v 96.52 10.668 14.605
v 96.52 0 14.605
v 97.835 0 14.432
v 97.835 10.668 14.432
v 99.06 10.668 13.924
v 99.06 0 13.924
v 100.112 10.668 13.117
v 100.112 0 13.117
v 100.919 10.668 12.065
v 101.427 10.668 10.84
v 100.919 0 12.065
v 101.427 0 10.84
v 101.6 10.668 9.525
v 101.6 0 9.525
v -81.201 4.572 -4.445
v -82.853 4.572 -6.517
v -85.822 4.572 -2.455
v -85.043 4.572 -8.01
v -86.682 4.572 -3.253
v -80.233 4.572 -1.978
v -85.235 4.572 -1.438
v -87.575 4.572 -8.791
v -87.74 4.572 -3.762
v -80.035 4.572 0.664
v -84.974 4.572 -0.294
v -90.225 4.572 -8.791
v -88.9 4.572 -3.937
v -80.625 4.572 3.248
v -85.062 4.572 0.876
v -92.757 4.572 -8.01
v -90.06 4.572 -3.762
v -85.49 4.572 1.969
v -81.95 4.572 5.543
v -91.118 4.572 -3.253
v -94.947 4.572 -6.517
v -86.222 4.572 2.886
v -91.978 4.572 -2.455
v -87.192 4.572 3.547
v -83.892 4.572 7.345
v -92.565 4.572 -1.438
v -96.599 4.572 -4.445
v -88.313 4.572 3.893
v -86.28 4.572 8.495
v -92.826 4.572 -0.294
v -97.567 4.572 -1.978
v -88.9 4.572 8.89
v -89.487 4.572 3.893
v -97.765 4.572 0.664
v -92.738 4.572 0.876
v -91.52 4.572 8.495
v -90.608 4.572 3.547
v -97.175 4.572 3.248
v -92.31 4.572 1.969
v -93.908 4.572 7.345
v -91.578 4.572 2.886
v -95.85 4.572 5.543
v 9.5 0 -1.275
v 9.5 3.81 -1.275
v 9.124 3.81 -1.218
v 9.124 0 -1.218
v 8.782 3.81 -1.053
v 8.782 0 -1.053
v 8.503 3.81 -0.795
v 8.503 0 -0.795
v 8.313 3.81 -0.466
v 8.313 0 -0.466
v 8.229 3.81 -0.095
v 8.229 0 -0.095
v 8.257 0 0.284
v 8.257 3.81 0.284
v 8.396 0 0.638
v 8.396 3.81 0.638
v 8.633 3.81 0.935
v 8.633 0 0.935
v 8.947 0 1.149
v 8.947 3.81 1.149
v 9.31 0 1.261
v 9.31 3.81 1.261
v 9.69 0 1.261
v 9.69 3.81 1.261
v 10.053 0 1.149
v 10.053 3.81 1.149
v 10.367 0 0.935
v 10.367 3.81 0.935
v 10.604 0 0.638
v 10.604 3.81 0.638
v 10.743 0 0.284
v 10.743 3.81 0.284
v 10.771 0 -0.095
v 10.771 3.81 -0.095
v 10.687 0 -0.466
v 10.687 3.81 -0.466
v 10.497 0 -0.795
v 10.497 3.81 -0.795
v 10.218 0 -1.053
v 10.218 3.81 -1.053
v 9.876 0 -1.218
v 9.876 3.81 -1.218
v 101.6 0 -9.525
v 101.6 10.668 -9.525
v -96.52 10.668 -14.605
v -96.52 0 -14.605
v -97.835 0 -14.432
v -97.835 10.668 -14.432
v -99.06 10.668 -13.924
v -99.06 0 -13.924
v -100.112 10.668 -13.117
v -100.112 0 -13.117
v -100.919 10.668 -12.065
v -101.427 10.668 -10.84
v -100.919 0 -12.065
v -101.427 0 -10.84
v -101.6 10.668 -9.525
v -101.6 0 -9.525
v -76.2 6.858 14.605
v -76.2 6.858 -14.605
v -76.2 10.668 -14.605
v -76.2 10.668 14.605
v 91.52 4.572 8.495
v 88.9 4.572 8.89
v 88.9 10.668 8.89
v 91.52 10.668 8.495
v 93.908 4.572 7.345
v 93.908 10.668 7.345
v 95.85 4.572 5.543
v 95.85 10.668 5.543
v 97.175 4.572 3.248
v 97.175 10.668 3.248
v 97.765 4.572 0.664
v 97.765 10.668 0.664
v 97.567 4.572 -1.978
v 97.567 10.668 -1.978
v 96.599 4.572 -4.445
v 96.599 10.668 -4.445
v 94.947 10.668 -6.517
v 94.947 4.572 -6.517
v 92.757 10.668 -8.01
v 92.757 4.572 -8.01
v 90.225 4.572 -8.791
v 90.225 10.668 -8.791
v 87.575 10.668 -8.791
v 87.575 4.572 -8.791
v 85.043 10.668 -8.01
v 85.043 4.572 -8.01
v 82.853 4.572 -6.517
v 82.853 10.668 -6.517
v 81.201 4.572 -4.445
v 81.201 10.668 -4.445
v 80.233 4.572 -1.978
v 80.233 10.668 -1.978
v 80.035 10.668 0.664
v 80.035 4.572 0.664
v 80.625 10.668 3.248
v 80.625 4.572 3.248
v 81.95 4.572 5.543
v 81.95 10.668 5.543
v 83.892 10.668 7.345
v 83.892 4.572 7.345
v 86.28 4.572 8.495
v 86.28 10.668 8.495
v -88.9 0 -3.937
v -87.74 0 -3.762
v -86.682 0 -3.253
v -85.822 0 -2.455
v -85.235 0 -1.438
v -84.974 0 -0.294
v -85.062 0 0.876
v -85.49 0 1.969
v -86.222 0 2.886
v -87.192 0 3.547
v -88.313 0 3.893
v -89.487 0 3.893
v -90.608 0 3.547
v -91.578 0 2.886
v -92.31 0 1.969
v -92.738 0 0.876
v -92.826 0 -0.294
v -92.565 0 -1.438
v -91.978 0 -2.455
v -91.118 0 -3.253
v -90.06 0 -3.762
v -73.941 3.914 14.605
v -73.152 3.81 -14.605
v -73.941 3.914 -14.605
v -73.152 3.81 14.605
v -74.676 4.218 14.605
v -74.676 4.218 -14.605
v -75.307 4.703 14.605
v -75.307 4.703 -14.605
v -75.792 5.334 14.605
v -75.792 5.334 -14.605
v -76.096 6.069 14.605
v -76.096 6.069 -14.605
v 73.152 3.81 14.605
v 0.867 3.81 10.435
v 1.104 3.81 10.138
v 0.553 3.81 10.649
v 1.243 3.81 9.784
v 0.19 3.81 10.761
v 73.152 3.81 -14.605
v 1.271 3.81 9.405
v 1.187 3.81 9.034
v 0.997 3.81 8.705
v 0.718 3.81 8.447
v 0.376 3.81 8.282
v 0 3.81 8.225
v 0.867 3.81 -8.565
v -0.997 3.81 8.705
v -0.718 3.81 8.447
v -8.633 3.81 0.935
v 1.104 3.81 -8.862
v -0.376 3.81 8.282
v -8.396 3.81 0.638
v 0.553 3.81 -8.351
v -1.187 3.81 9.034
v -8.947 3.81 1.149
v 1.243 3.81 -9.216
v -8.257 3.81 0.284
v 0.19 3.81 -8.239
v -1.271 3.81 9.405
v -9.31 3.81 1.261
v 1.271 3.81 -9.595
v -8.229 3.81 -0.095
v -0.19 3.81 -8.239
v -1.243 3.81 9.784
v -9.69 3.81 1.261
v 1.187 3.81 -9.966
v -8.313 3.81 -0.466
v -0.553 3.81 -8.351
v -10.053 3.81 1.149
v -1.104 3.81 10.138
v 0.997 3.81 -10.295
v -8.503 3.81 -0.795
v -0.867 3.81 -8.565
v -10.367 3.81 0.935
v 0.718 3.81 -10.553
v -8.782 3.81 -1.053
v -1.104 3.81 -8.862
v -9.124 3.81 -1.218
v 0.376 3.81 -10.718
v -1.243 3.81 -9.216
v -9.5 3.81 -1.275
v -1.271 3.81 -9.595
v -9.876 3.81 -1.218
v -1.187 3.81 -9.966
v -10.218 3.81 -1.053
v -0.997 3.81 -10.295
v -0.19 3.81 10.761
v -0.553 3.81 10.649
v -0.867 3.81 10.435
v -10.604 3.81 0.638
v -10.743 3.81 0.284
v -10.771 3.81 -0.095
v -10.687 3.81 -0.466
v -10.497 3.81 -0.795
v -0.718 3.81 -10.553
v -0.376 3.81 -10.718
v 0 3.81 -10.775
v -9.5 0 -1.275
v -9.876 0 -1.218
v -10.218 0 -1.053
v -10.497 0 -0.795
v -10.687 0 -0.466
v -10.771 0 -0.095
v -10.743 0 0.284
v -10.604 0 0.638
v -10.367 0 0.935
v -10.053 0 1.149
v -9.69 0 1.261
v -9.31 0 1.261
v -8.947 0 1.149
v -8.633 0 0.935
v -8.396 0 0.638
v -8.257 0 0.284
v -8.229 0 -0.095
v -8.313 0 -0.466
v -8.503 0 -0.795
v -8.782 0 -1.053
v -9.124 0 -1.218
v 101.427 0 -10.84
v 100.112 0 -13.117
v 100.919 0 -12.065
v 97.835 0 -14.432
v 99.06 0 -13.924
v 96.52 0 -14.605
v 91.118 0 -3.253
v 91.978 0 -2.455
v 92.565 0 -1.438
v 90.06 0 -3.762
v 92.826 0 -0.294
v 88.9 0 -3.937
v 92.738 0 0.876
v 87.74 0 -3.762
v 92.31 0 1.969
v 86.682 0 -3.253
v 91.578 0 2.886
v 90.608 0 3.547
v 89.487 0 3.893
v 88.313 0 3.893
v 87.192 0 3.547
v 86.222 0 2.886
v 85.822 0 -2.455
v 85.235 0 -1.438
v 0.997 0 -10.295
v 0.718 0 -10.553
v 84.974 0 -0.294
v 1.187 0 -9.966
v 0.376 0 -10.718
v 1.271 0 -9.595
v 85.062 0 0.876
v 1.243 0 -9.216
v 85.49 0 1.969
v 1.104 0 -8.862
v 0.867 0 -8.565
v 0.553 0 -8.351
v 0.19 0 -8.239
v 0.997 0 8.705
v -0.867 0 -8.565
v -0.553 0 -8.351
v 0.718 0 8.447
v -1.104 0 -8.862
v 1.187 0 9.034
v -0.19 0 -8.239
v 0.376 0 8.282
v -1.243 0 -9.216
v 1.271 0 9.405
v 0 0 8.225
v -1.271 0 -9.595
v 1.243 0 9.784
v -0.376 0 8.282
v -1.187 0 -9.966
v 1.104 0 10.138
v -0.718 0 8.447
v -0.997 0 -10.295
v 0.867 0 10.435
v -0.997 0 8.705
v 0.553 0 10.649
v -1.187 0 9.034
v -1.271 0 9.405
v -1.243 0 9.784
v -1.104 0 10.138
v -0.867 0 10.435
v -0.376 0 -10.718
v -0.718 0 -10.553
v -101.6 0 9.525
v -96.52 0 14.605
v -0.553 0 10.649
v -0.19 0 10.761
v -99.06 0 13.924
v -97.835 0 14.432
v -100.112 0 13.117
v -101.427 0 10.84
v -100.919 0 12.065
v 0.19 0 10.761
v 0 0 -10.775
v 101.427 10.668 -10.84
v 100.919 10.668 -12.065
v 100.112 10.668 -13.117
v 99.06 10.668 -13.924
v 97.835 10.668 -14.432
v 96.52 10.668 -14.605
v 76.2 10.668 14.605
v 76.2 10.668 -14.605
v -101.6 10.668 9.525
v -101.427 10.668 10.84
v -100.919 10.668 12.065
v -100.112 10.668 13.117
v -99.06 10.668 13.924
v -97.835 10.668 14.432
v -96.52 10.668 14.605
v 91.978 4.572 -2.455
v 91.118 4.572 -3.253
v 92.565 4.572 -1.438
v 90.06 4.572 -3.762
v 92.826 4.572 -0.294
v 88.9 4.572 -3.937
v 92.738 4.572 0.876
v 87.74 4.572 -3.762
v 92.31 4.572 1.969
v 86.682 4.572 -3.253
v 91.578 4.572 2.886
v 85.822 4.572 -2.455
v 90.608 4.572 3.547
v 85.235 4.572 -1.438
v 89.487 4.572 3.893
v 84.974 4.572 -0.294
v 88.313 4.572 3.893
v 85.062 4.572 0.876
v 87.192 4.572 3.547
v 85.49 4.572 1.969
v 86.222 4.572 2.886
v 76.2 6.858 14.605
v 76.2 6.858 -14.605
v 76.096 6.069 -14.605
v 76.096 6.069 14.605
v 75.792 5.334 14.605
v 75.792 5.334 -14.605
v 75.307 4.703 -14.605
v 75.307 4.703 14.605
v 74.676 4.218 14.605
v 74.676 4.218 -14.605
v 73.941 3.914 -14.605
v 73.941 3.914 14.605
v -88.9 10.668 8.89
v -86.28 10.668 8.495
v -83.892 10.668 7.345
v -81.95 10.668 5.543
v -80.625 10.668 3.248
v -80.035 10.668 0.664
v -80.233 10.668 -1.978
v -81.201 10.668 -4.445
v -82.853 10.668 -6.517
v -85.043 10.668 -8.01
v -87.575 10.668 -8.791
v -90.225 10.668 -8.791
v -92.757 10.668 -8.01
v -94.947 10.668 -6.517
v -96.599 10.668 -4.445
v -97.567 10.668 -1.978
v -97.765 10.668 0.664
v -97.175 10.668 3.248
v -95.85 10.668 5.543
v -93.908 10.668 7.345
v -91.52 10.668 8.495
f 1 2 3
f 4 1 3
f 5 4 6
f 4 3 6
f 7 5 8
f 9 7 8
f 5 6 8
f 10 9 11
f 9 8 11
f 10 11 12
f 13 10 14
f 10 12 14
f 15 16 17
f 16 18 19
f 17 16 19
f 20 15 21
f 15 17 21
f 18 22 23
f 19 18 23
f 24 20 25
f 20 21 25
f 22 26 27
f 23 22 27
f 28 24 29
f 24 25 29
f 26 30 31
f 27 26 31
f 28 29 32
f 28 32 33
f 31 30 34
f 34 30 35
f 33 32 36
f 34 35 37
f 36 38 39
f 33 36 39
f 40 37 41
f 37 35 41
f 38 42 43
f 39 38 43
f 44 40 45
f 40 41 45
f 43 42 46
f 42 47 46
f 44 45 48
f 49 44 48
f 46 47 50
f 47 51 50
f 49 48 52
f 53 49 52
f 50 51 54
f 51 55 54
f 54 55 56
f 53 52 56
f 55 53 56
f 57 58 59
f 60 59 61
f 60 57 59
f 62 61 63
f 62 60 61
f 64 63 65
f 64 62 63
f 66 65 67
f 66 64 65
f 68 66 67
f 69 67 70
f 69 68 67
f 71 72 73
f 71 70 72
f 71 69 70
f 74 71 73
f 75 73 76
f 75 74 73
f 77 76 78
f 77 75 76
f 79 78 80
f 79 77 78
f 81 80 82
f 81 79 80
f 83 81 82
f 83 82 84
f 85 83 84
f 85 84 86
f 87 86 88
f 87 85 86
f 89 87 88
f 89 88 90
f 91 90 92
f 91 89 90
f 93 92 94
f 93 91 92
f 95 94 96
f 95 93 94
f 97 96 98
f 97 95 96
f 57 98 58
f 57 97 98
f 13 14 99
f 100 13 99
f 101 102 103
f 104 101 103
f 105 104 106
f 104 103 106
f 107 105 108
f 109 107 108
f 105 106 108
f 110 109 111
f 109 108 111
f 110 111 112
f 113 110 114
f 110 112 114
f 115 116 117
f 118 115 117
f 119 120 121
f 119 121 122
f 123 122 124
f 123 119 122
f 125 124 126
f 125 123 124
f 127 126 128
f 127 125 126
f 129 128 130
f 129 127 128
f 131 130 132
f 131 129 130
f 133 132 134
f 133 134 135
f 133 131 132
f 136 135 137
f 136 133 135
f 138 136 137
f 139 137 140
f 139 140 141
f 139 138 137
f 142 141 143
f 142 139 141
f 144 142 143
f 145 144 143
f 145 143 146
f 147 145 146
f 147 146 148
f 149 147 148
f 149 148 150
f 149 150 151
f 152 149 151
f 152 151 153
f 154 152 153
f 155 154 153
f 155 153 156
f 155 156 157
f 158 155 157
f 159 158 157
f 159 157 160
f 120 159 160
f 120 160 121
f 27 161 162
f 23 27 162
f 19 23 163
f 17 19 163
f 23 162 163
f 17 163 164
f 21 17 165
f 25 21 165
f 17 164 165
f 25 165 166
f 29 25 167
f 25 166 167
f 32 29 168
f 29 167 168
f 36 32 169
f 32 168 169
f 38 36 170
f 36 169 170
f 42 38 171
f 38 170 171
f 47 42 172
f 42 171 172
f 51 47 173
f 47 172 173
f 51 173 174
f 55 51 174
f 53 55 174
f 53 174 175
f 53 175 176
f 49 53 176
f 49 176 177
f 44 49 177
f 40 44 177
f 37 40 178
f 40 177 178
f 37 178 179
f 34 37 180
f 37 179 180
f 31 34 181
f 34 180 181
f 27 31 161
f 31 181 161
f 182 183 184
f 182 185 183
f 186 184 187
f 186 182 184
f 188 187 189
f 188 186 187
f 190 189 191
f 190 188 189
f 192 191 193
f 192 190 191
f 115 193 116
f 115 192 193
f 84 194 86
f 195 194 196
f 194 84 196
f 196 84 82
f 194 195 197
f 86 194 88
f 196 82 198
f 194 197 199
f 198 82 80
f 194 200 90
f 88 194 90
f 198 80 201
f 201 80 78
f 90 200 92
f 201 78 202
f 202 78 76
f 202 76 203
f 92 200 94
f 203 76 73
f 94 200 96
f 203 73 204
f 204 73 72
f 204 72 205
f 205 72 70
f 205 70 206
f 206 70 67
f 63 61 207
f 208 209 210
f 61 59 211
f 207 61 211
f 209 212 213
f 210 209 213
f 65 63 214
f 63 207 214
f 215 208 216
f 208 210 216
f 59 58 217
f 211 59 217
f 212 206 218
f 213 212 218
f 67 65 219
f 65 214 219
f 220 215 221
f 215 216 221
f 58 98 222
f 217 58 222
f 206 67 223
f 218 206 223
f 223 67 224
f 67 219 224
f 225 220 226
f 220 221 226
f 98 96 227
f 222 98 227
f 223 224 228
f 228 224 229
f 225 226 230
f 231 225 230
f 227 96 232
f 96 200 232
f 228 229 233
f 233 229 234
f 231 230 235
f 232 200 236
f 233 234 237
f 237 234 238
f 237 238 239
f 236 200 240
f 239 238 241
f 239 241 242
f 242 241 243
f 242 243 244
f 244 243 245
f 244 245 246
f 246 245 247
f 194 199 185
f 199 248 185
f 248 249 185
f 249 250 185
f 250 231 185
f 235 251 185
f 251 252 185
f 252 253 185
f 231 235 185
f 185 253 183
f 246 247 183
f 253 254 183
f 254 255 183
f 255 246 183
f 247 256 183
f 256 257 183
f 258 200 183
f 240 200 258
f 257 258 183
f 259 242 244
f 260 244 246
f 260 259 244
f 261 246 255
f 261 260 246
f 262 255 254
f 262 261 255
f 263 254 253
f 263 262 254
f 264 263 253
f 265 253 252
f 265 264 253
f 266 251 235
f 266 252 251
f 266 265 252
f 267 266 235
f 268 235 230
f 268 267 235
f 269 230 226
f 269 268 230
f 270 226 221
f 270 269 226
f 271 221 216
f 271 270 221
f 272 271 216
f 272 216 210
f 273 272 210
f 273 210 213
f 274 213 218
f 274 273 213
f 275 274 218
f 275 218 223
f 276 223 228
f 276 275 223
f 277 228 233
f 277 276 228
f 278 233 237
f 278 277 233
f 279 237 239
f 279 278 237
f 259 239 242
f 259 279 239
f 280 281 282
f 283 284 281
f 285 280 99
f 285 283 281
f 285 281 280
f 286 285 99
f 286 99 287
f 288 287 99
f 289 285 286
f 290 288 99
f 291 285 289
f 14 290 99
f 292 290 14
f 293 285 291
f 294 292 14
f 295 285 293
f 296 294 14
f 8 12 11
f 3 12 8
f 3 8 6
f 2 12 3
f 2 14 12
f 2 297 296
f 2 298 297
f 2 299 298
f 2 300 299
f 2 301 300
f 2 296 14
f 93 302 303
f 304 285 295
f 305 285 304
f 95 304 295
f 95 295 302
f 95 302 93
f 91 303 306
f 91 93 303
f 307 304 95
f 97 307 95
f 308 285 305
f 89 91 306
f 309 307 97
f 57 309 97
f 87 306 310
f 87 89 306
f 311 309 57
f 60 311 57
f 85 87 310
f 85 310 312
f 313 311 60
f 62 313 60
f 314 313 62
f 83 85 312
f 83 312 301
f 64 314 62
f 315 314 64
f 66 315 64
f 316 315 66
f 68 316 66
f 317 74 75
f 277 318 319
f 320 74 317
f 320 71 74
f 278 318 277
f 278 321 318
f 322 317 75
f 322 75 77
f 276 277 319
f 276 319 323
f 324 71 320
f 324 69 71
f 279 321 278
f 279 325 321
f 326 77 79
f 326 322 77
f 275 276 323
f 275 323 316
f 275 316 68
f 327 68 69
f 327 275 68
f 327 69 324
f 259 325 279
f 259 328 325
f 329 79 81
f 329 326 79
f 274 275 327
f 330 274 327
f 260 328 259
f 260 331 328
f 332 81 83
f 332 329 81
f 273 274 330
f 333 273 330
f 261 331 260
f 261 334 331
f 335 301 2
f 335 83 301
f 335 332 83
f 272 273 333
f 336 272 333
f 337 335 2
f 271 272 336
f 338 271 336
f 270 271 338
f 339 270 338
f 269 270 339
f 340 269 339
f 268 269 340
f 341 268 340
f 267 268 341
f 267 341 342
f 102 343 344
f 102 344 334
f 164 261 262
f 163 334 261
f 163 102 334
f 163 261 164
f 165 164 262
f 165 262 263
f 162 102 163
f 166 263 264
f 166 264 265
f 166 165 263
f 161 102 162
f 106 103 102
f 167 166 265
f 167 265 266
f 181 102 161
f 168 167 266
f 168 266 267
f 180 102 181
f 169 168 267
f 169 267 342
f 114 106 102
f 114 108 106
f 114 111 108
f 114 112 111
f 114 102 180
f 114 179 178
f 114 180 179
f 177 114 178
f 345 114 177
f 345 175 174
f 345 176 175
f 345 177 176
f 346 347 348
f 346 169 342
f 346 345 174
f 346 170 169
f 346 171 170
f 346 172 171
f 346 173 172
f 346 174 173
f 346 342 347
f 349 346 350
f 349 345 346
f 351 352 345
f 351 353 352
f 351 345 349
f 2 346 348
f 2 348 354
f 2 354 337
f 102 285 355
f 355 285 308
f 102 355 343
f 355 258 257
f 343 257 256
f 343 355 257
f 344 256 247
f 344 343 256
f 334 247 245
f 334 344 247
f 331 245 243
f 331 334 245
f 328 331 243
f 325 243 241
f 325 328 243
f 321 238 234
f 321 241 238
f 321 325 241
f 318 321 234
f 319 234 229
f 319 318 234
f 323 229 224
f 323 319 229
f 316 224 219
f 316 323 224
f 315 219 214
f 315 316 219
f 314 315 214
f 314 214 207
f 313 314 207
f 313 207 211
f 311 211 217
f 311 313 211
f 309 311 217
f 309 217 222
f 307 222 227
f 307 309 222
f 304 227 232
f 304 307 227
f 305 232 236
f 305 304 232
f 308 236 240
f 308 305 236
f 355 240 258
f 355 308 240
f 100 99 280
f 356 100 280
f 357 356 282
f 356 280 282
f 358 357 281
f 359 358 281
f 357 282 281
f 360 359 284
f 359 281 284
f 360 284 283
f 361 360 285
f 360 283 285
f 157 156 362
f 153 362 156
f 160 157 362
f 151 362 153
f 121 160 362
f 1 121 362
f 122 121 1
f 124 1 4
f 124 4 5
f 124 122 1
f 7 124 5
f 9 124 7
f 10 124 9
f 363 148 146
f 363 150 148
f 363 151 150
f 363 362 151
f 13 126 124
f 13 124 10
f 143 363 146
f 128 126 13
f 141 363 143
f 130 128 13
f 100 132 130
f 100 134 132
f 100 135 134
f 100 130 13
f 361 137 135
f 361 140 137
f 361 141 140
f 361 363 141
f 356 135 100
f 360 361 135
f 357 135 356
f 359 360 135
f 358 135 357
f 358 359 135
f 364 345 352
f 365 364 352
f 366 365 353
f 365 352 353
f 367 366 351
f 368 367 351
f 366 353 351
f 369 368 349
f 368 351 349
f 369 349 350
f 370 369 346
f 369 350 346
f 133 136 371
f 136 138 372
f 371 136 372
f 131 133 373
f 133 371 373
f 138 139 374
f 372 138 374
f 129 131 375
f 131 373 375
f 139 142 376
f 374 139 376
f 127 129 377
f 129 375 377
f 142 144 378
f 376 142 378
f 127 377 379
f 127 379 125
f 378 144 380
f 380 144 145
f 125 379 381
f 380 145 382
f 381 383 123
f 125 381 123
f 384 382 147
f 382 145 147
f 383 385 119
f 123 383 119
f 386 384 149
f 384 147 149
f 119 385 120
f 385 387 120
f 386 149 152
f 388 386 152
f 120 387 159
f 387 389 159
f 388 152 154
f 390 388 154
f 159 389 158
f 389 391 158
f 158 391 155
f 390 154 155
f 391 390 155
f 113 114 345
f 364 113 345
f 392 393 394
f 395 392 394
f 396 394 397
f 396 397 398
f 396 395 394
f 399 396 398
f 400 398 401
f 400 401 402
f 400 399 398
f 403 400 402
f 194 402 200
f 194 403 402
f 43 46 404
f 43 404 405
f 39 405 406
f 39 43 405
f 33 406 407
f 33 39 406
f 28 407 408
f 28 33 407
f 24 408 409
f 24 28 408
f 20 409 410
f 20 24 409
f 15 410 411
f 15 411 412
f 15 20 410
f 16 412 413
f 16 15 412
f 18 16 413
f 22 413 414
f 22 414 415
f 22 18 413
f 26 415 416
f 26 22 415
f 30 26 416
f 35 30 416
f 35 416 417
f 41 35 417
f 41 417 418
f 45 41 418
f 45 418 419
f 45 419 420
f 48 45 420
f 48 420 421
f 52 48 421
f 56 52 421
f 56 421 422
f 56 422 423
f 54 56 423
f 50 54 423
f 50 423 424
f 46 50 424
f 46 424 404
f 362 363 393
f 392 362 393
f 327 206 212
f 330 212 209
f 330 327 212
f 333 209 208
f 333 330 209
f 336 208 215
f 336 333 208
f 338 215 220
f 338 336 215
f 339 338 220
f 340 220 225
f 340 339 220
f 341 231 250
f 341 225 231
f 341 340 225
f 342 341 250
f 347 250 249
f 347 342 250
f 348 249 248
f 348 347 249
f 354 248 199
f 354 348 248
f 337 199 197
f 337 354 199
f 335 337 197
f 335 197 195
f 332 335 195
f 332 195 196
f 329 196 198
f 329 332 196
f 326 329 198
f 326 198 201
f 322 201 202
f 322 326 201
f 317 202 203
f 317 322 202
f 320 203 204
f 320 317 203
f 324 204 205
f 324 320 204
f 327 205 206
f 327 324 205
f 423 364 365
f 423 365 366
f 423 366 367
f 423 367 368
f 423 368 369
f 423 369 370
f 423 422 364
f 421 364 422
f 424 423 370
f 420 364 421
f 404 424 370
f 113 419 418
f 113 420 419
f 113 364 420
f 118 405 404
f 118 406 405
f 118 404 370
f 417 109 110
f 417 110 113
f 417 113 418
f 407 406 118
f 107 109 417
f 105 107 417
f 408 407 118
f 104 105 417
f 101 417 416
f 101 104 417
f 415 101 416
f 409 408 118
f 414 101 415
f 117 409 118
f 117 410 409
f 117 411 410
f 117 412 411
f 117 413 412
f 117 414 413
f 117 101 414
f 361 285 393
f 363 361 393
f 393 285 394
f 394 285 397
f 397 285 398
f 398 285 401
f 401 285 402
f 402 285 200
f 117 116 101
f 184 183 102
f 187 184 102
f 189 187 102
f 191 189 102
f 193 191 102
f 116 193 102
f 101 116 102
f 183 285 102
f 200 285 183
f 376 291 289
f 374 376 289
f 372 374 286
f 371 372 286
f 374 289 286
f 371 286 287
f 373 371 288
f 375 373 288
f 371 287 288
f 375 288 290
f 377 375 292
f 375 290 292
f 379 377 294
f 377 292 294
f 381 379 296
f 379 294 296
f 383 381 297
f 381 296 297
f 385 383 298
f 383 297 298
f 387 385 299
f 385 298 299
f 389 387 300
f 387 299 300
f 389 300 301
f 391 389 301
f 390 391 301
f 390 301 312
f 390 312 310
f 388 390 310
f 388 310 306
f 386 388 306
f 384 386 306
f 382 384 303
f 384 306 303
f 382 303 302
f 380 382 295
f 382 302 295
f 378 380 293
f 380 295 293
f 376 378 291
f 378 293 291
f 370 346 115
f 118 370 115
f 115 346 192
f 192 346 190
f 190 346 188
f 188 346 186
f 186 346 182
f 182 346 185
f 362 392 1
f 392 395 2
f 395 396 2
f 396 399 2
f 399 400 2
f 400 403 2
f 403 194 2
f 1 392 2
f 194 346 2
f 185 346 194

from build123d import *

# Parameters (mm, degrees)
SKETCH1_R                = 13.97
SKETCH1_R_2              = 1.275
BOSS_EXTRUDE1_DEPTH      = 3.048
BOSS_EXTRUDE2_DEPTH      = 7.62
BOSS_EXTRUDE2_DEPTH_BACK = 3.048
SKETCH2_R                = 8.89
SKETCH2_R_2              = 1.275
CUT_EXTRUDE2_DEPTH       = 107.252483849
SKETCH6_R                = 8.89
SKETCH6_R_2              = 3.937
BOSS_EXTRUDE3_DEPTH      = 4.572
FILLET2_R                = 3.048


with BuildPart() as part:
    # Sketch1 → Boss-Extrude1 (new body)
    with BuildSketch(Plane(origin=(0, 0, 0), x_dir=(1, 0, 0), z_dir=(0, 1, 0))):
        with Locations(Location((0, 0, 0), (0, 0, 90))):
            Circle(SKETCH1_R)
        with Locations(Location((0, 9.5, 0), (0, 0, 90))):
            Circle(SKETCH1_R_2, mode=Mode.SUBTRACT)
        with Locations(Location((9.5, 0, 0), (0, 0, 90))):
            Circle(SKETCH1_R_2, mode=Mode.SUBTRACT)
        with Locations(Location((0, -9.5, 0), (0, 0, 90))):
            Circle(SKETCH1_R_2, mode=Mode.SUBTRACT)
        with Locations(Location((-9.5, 0, 0), (0, 0, 90))):
            Circle(SKETCH1_R_2, mode=Mode.SUBTRACT)
    extrude(amount=BOSS_EXTRUDE1_DEPTH)

    # Sketch2 → Boss-Extrude2 (add, two sides: drawn at the far end of the back side and taken through both)
    with BuildSketch(Plane(origin=(0, 3.048, 0), x_dir=(1, 0, 0), z_dir=(0, 1, 0)).offset(-BOSS_EXTRUDE2_DEPTH_BACK)):
        with BuildLine():
            Line((-96.52, -14.605), (96.52, -14.605))
            ThreePointArc((96.52, -14.605), (100.112102448, -13.117102448), (101.6, -9.525))
            Line((101.6, -9.525), (101.6, 9.525))
            ThreePointArc((101.6, 9.525), (100.112102448, 13.117102448), (96.52, 14.605))
            Line((96.52, 14.605), (-96.52, 14.605))
            ThreePointArc((-96.52, 14.605), (-100.112102448, 13.117102448), (-101.6, 9.525))
            Line((-101.6, 9.525), (-101.6, -9.525))
            ThreePointArc((-101.6, -9.525), (-100.112102448, -13.117102448), (-96.52, -14.605))
        make_face()
        with Locations(Location((-88.9, 0, 0), (0, 0, 270))):
            Circle(SKETCH2_R, mode=Mode.SUBTRACT)
        with Locations(Location((88.9, 0, 0), (0, 0, 270))):
            Circle(SKETCH2_R, mode=Mode.SUBTRACT)
        with Locations(Location((9.5, 0, 0), (0, 0, 90))):
            Circle(SKETCH2_R_2, mode=Mode.SUBTRACT)
        with Locations(Location((0, 9.5, 0), (0, 0, 90))):
            Circle(SKETCH2_R_2, mode=Mode.SUBTRACT)
        with Locations(Location((-9.5, 0, 0), (0, 0, 90))):
            Circle(SKETCH2_R_2, mode=Mode.SUBTRACT)
        with Locations(Location((0, -9.5, 0), (0, 0, 90))):
            Circle(SKETCH2_R_2, mode=Mode.SUBTRACT)
    extrude(amount=BOSS_EXTRUDE2_DEPTH + BOSS_EXTRUDE2_DEPTH_BACK)

    # Sketch5 → Cut-Extrude2 (cut, through all)
    with BuildSketch(Plane(origin=(0, 0, -14.605), x_dir=(-1, 0, 0), z_dir=(0, 0, -1))):
        Polygon((-76.2, 3.81), (0, 3.81), (76.2, 3.81), (76.2, 10.668), (-76.2, 10.668), align=None)
    extrude(amount=-CUT_EXTRUDE2_DEPTH, mode=Mode.SUBTRACT)

    # Sketch6 → Boss-Extrude3 (add)
    # profile 1 of 2: a face of its own
    with BuildSketch(Plane.XZ):
        with Locations(Location((-88.9, 0, 0), (0, 0, 90))):
            Circle(SKETCH6_R)
        with Locations(Location((-88.9, 0, 0), (0, 0, 270))):
            Circle(SKETCH6_R_2, mode=Mode.SUBTRACT)
    # profile 2 of 2: a face of its own
    with BuildSketch(Plane.XZ):
        with Locations(Location((88.9, 0, 0), (0, 0, 90))):
            Circle(SKETCH6_R)
        with Locations(Location((88.9, 0, 0), (0, 0, 270))):
            Circle(SKETCH6_R_2, mode=Mode.SUBTRACT)
    extrude(amount=-BOSS_EXTRUDE3_DEPTH)

    # Fillet2
    fillet2_edges = [part.edges().sort_by_distance(p)[0] for p in [
        (-76.2, 3.81, 0),
        (76.2, 3.81, 0),
    ]]
    fillet(fillet2_edges, radius=FILLET2_R)


solid = part.part
